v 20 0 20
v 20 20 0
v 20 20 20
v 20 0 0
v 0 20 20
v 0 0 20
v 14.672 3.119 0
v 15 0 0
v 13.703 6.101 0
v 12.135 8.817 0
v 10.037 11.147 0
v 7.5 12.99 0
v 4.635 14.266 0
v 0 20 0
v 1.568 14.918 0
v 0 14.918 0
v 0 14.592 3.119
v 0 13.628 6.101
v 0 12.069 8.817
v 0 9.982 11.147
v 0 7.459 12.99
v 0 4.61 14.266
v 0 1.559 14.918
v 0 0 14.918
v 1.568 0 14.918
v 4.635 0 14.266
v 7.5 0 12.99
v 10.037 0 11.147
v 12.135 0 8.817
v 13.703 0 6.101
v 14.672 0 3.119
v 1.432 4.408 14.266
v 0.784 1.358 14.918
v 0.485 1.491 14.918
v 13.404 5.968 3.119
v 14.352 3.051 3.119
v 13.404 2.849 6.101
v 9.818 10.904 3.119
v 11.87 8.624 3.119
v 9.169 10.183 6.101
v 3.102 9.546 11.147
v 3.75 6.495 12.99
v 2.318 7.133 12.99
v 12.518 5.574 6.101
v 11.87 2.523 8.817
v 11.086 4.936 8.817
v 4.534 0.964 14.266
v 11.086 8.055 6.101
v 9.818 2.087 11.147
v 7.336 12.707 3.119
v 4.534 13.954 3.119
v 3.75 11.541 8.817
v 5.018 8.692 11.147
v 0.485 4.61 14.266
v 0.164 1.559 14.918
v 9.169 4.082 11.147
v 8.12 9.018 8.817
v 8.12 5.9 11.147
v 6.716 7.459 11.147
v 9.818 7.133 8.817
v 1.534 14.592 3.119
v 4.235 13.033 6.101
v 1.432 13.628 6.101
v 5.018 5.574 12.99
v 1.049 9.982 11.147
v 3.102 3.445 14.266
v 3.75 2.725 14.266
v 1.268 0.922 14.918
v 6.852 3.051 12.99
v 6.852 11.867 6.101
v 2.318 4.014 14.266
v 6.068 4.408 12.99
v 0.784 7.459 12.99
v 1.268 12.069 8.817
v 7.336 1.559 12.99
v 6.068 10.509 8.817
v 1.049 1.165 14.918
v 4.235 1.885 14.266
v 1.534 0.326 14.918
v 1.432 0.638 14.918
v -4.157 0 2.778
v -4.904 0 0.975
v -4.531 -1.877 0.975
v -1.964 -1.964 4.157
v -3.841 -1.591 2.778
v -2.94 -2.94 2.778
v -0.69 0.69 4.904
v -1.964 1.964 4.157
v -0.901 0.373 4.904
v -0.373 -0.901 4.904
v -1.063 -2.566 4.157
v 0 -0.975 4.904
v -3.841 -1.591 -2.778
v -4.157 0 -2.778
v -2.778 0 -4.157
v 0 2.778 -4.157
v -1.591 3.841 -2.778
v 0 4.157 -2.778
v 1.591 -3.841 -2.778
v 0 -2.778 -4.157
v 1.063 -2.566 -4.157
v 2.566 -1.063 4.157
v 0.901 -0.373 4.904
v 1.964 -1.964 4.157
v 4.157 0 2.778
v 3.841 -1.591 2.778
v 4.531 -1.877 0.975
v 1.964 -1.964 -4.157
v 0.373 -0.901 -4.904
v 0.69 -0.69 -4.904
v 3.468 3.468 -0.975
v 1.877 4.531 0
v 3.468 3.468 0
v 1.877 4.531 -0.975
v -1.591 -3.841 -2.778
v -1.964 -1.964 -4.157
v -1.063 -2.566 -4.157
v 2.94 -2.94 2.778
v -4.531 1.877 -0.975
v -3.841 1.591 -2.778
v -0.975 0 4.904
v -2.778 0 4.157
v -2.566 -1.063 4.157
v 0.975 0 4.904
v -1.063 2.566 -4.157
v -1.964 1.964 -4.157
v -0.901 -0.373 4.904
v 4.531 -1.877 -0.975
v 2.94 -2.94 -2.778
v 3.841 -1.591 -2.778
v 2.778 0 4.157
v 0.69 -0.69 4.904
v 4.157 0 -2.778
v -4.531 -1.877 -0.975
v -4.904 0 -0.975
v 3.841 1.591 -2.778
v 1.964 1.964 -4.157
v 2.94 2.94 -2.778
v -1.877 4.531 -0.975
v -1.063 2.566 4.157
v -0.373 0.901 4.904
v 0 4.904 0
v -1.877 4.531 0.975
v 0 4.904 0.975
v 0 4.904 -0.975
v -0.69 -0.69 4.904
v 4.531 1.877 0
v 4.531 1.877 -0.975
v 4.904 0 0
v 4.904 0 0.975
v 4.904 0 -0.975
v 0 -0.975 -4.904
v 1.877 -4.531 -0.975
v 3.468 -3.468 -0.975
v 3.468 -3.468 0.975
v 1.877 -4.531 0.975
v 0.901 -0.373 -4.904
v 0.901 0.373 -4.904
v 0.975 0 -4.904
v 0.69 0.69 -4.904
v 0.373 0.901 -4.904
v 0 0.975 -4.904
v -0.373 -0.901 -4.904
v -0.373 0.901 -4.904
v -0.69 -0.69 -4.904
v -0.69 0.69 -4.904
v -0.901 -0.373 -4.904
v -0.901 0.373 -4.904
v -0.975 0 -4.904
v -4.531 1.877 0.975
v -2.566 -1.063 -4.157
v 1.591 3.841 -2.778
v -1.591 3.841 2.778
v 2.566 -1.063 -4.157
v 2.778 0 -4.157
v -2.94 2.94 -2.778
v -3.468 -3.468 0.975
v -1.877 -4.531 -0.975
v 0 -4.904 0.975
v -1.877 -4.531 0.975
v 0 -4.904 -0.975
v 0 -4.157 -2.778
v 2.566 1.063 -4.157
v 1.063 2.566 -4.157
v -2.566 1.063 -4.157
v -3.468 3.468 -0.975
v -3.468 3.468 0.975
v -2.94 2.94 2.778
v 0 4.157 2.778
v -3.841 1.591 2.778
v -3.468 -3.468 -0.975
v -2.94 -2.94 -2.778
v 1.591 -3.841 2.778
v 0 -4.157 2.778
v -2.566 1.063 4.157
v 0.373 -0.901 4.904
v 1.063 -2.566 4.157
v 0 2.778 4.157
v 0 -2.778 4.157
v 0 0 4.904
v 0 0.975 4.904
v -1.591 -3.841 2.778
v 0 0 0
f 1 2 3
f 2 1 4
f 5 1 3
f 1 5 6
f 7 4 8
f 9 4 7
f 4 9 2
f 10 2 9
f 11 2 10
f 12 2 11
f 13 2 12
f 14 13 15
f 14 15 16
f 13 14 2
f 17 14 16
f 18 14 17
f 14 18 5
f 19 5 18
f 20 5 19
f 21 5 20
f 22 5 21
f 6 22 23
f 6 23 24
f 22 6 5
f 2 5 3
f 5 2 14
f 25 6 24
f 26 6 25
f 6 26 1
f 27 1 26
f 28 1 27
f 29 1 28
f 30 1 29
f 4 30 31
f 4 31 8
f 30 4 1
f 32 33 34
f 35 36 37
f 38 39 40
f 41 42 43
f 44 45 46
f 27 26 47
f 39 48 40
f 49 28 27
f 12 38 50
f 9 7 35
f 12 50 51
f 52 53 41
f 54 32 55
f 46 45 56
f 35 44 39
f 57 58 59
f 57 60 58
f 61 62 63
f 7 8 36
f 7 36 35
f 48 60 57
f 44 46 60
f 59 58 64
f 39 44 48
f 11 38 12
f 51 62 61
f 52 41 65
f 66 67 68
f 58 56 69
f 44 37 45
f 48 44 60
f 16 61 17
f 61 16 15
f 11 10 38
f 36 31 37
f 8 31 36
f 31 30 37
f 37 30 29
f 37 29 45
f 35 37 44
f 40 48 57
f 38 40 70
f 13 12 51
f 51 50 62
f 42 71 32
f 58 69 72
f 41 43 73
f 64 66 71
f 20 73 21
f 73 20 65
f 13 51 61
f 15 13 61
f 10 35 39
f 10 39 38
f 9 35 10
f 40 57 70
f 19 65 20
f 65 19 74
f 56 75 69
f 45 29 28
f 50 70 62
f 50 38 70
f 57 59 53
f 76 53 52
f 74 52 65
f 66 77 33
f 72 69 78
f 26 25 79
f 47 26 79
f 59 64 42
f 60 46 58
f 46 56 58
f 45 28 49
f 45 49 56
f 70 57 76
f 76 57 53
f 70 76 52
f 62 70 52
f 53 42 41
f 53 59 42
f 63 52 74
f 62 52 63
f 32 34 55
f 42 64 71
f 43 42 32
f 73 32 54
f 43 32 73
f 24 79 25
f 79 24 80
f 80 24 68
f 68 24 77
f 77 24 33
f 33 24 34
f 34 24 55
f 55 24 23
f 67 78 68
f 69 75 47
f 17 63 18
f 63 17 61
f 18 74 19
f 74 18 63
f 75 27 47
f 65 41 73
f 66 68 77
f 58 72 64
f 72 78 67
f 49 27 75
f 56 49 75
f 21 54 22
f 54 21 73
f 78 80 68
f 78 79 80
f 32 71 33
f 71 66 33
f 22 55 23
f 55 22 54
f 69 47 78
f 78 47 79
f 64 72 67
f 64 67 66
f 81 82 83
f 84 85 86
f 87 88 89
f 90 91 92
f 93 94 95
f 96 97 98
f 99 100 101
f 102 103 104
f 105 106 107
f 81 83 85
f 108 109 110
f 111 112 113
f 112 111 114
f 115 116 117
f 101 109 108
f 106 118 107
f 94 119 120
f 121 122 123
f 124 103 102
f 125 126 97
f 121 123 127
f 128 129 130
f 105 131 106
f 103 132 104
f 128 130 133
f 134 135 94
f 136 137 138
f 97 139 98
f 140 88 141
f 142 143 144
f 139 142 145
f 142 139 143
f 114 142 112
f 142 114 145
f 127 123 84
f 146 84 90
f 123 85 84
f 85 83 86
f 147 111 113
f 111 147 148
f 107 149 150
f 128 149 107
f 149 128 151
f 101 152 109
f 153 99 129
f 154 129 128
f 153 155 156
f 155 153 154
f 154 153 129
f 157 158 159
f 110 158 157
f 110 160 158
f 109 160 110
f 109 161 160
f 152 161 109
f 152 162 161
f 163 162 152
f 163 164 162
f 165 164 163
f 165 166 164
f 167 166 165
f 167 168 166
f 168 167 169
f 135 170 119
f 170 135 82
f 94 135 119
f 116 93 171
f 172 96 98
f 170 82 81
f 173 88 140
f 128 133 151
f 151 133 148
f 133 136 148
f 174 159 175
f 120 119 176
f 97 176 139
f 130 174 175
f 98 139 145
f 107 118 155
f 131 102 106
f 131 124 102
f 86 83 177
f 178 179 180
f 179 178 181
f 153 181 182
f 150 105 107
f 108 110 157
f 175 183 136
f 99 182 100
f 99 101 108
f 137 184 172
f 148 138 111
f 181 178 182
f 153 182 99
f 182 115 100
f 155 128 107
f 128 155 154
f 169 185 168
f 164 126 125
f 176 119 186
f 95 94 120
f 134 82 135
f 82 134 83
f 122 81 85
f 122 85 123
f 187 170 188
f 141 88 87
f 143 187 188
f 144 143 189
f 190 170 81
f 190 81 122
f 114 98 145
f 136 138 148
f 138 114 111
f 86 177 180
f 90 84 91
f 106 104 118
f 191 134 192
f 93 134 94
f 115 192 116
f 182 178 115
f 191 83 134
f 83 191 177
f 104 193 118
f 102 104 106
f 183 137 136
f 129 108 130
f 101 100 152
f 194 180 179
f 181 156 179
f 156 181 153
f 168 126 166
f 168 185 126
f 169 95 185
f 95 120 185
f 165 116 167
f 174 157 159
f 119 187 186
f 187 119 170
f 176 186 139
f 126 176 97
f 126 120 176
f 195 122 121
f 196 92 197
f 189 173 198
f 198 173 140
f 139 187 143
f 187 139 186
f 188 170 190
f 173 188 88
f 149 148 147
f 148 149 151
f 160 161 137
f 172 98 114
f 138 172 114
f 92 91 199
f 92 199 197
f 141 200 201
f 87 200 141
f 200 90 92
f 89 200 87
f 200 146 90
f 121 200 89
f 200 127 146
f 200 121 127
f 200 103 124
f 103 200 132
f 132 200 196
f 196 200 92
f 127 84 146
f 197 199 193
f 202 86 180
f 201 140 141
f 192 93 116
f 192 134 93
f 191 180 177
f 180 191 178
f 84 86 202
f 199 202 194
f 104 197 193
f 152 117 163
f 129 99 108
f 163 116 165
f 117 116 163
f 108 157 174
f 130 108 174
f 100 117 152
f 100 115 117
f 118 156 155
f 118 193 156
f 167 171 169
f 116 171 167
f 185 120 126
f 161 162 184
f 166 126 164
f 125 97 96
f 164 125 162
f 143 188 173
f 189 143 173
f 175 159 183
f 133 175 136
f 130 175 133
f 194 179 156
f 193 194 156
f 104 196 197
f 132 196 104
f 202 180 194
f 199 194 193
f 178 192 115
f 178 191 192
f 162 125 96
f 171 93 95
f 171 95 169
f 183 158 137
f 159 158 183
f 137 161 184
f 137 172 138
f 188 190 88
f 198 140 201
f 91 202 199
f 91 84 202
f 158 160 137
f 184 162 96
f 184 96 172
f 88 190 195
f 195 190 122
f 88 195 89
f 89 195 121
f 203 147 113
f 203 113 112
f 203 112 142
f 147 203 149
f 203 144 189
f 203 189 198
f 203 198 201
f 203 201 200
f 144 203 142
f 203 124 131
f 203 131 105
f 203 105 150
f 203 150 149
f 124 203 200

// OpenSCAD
difference(){
    cube([20,20,20]);
    sphere(r=15);
}

difference(){
    sphere(r=5);
    cube([10,10,10]);
}
